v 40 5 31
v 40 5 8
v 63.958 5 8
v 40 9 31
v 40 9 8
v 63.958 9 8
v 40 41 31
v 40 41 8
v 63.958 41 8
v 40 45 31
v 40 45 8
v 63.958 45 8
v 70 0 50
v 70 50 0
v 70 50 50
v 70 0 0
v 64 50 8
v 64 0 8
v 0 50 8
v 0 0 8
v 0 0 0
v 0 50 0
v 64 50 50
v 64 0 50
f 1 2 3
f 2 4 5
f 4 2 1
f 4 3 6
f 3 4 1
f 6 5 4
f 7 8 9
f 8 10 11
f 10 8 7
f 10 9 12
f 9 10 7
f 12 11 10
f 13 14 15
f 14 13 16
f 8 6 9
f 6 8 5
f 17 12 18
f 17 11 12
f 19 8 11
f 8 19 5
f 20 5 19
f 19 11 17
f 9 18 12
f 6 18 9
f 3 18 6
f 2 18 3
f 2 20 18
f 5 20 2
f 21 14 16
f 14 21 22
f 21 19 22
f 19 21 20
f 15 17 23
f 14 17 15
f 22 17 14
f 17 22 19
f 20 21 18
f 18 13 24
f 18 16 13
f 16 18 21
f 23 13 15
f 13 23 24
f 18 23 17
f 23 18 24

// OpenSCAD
$fn = 32;

// ----------------------------------------------------------------------
// Rib bracket: 2-gusset L bracket
// ----------------------------------------------------------------------

// --- parameters (mm) ---
base_l = 70;              // foot length, X
base_w = 50;              // foot width, Y
base_t = 8;               // foot thickness
plate_t = 6;              // upright plate thickness
plate_h = 50;             // overall height
gus_l = 24;               // gusset leg along the foot
gus_h = 24;               // gusset height
gus_t = 4;                // gusset thickness
gus_edge = 5;             // gusset margin from the foot edge
n_gus = 2;                // gusset count

gus_pitch = (base_w - 2 * gus_edge - gus_t) / (n_gus - 1);  // gusset pitch

union() {
  cube([base_l, base_w, base_t]);
  translate([base_l - plate_t, 0, base_t - 1])
    cube([plate_t, base_w, plate_h - base_t + 1]);
  for (i = [0 : n_gus - 1])
    translate([base_l - plate_t - gus_l, gus_edge + i * gus_pitch, base_t - 1])
      rotate([-90, 0, 0])
        linear_extrude(height = gus_t)
          polygon(points = [[0, 0], [gus_l + 1, 0], [0, -gus_h]]);
}
